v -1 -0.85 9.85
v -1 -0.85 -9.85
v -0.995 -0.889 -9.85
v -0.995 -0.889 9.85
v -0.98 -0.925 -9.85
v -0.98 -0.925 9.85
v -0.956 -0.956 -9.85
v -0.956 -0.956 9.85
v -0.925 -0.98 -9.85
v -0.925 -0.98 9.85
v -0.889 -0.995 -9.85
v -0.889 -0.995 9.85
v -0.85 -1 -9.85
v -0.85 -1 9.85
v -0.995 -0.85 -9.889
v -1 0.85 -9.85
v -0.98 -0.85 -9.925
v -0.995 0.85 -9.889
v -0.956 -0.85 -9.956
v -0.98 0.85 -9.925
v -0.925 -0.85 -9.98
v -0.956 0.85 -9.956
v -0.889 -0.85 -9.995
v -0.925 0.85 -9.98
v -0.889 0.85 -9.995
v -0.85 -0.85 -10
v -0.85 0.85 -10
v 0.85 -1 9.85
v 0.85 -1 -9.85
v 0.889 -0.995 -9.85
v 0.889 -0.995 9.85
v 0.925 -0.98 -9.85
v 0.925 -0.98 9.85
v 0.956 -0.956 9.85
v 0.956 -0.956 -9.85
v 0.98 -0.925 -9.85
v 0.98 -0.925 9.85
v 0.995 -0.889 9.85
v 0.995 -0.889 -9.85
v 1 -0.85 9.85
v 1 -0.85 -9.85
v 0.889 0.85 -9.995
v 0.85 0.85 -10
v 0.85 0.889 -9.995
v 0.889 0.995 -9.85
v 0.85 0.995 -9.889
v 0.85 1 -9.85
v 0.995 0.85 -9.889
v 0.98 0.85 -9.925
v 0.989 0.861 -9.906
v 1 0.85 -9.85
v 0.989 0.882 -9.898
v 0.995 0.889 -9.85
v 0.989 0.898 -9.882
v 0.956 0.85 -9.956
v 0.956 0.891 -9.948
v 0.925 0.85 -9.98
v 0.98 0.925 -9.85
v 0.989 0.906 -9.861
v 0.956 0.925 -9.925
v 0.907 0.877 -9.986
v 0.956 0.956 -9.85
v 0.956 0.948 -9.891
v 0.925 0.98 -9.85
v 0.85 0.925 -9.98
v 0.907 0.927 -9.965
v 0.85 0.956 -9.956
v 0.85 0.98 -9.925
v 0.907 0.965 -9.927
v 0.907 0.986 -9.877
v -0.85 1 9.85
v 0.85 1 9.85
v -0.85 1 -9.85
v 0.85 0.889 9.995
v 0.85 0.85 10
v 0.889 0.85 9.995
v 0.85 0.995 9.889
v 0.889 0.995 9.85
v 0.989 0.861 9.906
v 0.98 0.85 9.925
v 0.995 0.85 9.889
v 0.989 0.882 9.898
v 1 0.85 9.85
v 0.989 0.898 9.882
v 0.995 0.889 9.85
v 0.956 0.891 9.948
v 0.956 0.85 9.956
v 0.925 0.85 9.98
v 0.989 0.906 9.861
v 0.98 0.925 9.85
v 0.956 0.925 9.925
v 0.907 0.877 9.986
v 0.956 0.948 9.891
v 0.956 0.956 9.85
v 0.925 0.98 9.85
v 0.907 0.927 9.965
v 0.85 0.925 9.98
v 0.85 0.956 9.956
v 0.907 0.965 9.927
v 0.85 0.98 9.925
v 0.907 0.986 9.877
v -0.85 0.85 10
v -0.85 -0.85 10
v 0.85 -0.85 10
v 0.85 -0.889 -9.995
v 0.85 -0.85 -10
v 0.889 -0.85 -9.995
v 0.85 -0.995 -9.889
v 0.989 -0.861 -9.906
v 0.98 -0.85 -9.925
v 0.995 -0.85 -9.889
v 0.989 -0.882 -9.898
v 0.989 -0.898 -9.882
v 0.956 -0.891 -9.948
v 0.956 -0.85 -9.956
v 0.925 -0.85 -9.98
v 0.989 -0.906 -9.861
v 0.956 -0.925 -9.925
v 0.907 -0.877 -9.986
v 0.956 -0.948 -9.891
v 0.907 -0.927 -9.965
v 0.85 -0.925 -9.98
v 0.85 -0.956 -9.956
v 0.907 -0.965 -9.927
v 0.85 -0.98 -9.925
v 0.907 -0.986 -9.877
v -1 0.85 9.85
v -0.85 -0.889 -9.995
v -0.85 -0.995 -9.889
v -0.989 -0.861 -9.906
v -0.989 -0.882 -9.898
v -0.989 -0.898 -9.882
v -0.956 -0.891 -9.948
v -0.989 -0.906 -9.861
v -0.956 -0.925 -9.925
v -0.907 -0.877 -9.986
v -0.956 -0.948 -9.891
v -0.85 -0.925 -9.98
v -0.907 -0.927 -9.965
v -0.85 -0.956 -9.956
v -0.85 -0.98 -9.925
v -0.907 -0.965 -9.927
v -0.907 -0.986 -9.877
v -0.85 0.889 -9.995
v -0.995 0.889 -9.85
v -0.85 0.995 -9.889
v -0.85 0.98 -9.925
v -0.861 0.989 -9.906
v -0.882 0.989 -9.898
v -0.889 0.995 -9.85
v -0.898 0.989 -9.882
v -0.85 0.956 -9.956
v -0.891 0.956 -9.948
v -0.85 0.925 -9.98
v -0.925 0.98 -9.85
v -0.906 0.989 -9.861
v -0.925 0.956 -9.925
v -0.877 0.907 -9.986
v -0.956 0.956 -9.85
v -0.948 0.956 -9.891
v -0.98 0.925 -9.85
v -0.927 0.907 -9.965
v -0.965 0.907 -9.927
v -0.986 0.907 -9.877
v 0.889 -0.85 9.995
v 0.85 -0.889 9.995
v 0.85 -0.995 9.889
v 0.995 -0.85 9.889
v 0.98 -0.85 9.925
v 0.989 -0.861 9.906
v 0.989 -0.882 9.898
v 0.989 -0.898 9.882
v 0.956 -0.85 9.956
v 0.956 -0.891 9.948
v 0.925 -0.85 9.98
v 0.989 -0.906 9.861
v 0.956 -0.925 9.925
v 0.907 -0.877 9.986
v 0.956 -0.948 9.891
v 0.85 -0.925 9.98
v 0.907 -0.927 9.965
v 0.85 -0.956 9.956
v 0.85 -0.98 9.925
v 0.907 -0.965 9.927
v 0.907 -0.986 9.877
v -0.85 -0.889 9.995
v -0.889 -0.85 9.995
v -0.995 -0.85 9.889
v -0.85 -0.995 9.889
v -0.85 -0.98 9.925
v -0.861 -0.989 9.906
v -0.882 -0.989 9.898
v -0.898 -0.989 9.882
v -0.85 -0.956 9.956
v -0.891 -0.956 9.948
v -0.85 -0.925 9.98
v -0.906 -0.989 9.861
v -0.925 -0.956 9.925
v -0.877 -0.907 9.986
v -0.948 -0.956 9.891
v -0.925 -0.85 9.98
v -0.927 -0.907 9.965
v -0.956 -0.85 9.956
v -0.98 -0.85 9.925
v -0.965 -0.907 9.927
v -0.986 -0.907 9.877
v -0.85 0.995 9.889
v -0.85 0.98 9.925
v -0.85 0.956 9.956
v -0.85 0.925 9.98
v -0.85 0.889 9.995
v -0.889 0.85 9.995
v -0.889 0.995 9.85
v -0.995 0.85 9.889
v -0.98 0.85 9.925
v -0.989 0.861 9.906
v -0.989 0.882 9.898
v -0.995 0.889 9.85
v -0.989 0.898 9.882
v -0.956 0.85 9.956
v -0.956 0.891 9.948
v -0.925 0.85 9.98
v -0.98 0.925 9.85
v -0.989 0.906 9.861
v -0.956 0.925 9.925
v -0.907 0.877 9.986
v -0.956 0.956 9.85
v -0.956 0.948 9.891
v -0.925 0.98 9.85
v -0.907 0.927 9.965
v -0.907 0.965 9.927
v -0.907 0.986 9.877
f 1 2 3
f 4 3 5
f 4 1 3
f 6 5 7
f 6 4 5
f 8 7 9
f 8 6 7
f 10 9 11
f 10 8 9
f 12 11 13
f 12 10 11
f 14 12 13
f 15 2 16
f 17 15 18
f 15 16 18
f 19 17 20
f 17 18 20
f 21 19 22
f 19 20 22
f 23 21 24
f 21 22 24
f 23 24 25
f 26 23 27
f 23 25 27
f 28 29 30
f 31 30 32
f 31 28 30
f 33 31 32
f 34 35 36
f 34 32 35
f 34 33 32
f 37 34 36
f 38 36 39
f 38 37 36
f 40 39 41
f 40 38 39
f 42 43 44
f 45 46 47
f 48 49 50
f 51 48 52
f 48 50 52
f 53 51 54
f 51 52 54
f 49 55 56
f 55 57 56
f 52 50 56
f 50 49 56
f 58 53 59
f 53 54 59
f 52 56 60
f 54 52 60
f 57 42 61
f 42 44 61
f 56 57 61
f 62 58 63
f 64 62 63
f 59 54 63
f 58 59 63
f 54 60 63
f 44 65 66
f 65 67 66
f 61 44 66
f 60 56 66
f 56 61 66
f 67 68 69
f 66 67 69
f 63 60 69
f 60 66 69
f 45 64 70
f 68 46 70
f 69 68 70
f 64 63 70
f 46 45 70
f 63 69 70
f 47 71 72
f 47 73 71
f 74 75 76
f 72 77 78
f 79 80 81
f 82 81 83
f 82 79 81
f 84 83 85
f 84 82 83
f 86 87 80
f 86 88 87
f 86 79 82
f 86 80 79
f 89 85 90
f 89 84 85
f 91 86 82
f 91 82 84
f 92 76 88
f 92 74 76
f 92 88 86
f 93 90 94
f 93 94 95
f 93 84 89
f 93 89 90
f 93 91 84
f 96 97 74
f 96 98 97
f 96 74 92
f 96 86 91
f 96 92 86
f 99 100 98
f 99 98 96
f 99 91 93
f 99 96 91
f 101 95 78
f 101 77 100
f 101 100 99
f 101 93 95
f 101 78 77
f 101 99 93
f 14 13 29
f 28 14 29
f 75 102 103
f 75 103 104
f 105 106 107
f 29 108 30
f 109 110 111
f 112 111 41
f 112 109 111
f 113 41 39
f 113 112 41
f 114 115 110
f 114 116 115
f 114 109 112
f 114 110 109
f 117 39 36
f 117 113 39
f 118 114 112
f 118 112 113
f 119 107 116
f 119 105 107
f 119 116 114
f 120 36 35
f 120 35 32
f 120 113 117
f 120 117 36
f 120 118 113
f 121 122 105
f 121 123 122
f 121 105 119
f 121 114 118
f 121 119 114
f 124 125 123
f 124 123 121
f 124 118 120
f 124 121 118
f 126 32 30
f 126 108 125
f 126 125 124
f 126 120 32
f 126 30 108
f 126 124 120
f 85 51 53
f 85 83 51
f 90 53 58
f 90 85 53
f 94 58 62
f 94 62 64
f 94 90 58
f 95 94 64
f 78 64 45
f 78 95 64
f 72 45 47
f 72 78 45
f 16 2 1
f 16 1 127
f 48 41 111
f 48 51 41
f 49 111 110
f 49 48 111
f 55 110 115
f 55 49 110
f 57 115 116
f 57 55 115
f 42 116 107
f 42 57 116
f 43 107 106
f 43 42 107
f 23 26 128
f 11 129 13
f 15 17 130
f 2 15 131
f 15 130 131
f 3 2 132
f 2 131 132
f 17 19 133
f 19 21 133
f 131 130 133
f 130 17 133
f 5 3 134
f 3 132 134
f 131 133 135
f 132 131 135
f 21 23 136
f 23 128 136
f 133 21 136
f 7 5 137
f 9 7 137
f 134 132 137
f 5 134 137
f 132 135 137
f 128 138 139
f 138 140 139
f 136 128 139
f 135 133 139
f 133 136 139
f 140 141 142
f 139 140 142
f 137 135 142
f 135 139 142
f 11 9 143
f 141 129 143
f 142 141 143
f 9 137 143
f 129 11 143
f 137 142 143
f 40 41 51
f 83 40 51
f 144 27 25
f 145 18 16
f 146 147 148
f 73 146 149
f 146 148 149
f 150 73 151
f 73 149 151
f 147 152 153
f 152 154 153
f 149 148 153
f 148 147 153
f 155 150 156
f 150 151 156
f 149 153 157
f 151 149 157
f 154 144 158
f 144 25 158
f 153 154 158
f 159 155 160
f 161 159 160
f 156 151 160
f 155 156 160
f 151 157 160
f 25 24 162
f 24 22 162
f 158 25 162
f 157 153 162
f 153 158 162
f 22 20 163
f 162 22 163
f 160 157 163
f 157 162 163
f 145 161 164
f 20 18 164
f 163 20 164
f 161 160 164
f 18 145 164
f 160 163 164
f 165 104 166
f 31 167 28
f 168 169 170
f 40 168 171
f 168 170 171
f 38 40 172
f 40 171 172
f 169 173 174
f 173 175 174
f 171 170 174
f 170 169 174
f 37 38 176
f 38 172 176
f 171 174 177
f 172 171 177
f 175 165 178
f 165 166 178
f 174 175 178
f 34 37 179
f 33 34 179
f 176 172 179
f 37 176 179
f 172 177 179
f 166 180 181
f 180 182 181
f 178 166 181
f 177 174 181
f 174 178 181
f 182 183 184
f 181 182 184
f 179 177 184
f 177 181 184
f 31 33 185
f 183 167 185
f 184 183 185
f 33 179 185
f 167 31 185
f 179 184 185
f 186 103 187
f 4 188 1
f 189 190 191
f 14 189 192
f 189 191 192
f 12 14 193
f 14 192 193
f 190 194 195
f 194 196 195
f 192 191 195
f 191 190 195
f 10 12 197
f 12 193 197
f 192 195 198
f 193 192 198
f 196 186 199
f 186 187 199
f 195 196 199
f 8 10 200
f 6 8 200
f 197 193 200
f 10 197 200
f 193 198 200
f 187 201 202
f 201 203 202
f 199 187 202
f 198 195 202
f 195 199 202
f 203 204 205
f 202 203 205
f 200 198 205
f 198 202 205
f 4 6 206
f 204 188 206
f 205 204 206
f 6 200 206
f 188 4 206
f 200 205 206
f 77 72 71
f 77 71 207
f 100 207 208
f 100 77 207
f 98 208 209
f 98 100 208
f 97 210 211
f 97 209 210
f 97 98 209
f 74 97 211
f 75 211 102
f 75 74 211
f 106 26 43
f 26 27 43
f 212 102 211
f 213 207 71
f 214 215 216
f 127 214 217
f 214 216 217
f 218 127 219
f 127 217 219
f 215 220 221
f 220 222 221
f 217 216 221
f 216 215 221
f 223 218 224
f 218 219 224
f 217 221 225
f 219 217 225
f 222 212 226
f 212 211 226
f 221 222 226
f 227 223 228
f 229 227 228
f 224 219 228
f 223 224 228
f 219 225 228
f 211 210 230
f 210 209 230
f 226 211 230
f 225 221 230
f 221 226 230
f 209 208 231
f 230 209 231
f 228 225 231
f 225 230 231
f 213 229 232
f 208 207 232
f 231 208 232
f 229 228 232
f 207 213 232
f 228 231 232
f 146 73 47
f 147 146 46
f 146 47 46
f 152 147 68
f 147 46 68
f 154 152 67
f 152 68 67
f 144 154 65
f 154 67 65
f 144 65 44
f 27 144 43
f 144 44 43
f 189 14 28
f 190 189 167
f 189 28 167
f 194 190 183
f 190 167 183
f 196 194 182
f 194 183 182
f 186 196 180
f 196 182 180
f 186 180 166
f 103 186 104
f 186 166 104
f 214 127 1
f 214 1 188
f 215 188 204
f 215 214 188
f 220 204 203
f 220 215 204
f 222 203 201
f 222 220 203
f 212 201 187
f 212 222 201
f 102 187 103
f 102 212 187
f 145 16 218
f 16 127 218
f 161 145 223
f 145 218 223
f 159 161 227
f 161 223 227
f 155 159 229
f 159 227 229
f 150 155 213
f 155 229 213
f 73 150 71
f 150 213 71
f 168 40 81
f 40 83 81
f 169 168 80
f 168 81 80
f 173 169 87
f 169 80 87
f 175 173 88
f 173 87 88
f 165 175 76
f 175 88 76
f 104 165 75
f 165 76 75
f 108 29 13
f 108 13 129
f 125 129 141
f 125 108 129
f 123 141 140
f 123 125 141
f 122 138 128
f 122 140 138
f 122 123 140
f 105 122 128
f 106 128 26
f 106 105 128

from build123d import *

# Parameters (mm, degrees)
BOSS_EXTRUDE1_DEPTH      = 10
BOSS_EXTRUDE1_DEPTH_BACK = 10
SKETCH3_W                = 2
SKETCH3_H                = 2
FILLET2_R                = 0.15


with BuildPart() as part:
    # Sketch3 → Boss-Extrude1 (new, two sides: drawn at the far end of the back side and taken through both)
    with BuildSketch(Plane.XY.offset(-BOSS_EXTRUDE1_DEPTH_BACK)):
        Rectangle(SKETCH3_W, SKETCH3_H)
    extrude(amount=BOSS_EXTRUDE1_DEPTH + BOSS_EXTRUDE1_DEPTH_BACK)

    # Fillet2
    fillet2_edges = [part.edges().sort_by_distance(p)[0] for p in [
        (0, 1, 10),
        (0, -1, -10),
        (-1, 0, -10),
        (0, 1, -10),
        (1, 0, -10),
        (-1, 0, 10),
        (0, -1, 10),
        (1, 0, 10),
        (-1, -1, 0),
        (-1, 1, 0),
        (1, 1, 0),
        (1, -1, 0),
    ]]
    fillet(fillet2_edges, radius=FILLET2_R)


solid = part.part
